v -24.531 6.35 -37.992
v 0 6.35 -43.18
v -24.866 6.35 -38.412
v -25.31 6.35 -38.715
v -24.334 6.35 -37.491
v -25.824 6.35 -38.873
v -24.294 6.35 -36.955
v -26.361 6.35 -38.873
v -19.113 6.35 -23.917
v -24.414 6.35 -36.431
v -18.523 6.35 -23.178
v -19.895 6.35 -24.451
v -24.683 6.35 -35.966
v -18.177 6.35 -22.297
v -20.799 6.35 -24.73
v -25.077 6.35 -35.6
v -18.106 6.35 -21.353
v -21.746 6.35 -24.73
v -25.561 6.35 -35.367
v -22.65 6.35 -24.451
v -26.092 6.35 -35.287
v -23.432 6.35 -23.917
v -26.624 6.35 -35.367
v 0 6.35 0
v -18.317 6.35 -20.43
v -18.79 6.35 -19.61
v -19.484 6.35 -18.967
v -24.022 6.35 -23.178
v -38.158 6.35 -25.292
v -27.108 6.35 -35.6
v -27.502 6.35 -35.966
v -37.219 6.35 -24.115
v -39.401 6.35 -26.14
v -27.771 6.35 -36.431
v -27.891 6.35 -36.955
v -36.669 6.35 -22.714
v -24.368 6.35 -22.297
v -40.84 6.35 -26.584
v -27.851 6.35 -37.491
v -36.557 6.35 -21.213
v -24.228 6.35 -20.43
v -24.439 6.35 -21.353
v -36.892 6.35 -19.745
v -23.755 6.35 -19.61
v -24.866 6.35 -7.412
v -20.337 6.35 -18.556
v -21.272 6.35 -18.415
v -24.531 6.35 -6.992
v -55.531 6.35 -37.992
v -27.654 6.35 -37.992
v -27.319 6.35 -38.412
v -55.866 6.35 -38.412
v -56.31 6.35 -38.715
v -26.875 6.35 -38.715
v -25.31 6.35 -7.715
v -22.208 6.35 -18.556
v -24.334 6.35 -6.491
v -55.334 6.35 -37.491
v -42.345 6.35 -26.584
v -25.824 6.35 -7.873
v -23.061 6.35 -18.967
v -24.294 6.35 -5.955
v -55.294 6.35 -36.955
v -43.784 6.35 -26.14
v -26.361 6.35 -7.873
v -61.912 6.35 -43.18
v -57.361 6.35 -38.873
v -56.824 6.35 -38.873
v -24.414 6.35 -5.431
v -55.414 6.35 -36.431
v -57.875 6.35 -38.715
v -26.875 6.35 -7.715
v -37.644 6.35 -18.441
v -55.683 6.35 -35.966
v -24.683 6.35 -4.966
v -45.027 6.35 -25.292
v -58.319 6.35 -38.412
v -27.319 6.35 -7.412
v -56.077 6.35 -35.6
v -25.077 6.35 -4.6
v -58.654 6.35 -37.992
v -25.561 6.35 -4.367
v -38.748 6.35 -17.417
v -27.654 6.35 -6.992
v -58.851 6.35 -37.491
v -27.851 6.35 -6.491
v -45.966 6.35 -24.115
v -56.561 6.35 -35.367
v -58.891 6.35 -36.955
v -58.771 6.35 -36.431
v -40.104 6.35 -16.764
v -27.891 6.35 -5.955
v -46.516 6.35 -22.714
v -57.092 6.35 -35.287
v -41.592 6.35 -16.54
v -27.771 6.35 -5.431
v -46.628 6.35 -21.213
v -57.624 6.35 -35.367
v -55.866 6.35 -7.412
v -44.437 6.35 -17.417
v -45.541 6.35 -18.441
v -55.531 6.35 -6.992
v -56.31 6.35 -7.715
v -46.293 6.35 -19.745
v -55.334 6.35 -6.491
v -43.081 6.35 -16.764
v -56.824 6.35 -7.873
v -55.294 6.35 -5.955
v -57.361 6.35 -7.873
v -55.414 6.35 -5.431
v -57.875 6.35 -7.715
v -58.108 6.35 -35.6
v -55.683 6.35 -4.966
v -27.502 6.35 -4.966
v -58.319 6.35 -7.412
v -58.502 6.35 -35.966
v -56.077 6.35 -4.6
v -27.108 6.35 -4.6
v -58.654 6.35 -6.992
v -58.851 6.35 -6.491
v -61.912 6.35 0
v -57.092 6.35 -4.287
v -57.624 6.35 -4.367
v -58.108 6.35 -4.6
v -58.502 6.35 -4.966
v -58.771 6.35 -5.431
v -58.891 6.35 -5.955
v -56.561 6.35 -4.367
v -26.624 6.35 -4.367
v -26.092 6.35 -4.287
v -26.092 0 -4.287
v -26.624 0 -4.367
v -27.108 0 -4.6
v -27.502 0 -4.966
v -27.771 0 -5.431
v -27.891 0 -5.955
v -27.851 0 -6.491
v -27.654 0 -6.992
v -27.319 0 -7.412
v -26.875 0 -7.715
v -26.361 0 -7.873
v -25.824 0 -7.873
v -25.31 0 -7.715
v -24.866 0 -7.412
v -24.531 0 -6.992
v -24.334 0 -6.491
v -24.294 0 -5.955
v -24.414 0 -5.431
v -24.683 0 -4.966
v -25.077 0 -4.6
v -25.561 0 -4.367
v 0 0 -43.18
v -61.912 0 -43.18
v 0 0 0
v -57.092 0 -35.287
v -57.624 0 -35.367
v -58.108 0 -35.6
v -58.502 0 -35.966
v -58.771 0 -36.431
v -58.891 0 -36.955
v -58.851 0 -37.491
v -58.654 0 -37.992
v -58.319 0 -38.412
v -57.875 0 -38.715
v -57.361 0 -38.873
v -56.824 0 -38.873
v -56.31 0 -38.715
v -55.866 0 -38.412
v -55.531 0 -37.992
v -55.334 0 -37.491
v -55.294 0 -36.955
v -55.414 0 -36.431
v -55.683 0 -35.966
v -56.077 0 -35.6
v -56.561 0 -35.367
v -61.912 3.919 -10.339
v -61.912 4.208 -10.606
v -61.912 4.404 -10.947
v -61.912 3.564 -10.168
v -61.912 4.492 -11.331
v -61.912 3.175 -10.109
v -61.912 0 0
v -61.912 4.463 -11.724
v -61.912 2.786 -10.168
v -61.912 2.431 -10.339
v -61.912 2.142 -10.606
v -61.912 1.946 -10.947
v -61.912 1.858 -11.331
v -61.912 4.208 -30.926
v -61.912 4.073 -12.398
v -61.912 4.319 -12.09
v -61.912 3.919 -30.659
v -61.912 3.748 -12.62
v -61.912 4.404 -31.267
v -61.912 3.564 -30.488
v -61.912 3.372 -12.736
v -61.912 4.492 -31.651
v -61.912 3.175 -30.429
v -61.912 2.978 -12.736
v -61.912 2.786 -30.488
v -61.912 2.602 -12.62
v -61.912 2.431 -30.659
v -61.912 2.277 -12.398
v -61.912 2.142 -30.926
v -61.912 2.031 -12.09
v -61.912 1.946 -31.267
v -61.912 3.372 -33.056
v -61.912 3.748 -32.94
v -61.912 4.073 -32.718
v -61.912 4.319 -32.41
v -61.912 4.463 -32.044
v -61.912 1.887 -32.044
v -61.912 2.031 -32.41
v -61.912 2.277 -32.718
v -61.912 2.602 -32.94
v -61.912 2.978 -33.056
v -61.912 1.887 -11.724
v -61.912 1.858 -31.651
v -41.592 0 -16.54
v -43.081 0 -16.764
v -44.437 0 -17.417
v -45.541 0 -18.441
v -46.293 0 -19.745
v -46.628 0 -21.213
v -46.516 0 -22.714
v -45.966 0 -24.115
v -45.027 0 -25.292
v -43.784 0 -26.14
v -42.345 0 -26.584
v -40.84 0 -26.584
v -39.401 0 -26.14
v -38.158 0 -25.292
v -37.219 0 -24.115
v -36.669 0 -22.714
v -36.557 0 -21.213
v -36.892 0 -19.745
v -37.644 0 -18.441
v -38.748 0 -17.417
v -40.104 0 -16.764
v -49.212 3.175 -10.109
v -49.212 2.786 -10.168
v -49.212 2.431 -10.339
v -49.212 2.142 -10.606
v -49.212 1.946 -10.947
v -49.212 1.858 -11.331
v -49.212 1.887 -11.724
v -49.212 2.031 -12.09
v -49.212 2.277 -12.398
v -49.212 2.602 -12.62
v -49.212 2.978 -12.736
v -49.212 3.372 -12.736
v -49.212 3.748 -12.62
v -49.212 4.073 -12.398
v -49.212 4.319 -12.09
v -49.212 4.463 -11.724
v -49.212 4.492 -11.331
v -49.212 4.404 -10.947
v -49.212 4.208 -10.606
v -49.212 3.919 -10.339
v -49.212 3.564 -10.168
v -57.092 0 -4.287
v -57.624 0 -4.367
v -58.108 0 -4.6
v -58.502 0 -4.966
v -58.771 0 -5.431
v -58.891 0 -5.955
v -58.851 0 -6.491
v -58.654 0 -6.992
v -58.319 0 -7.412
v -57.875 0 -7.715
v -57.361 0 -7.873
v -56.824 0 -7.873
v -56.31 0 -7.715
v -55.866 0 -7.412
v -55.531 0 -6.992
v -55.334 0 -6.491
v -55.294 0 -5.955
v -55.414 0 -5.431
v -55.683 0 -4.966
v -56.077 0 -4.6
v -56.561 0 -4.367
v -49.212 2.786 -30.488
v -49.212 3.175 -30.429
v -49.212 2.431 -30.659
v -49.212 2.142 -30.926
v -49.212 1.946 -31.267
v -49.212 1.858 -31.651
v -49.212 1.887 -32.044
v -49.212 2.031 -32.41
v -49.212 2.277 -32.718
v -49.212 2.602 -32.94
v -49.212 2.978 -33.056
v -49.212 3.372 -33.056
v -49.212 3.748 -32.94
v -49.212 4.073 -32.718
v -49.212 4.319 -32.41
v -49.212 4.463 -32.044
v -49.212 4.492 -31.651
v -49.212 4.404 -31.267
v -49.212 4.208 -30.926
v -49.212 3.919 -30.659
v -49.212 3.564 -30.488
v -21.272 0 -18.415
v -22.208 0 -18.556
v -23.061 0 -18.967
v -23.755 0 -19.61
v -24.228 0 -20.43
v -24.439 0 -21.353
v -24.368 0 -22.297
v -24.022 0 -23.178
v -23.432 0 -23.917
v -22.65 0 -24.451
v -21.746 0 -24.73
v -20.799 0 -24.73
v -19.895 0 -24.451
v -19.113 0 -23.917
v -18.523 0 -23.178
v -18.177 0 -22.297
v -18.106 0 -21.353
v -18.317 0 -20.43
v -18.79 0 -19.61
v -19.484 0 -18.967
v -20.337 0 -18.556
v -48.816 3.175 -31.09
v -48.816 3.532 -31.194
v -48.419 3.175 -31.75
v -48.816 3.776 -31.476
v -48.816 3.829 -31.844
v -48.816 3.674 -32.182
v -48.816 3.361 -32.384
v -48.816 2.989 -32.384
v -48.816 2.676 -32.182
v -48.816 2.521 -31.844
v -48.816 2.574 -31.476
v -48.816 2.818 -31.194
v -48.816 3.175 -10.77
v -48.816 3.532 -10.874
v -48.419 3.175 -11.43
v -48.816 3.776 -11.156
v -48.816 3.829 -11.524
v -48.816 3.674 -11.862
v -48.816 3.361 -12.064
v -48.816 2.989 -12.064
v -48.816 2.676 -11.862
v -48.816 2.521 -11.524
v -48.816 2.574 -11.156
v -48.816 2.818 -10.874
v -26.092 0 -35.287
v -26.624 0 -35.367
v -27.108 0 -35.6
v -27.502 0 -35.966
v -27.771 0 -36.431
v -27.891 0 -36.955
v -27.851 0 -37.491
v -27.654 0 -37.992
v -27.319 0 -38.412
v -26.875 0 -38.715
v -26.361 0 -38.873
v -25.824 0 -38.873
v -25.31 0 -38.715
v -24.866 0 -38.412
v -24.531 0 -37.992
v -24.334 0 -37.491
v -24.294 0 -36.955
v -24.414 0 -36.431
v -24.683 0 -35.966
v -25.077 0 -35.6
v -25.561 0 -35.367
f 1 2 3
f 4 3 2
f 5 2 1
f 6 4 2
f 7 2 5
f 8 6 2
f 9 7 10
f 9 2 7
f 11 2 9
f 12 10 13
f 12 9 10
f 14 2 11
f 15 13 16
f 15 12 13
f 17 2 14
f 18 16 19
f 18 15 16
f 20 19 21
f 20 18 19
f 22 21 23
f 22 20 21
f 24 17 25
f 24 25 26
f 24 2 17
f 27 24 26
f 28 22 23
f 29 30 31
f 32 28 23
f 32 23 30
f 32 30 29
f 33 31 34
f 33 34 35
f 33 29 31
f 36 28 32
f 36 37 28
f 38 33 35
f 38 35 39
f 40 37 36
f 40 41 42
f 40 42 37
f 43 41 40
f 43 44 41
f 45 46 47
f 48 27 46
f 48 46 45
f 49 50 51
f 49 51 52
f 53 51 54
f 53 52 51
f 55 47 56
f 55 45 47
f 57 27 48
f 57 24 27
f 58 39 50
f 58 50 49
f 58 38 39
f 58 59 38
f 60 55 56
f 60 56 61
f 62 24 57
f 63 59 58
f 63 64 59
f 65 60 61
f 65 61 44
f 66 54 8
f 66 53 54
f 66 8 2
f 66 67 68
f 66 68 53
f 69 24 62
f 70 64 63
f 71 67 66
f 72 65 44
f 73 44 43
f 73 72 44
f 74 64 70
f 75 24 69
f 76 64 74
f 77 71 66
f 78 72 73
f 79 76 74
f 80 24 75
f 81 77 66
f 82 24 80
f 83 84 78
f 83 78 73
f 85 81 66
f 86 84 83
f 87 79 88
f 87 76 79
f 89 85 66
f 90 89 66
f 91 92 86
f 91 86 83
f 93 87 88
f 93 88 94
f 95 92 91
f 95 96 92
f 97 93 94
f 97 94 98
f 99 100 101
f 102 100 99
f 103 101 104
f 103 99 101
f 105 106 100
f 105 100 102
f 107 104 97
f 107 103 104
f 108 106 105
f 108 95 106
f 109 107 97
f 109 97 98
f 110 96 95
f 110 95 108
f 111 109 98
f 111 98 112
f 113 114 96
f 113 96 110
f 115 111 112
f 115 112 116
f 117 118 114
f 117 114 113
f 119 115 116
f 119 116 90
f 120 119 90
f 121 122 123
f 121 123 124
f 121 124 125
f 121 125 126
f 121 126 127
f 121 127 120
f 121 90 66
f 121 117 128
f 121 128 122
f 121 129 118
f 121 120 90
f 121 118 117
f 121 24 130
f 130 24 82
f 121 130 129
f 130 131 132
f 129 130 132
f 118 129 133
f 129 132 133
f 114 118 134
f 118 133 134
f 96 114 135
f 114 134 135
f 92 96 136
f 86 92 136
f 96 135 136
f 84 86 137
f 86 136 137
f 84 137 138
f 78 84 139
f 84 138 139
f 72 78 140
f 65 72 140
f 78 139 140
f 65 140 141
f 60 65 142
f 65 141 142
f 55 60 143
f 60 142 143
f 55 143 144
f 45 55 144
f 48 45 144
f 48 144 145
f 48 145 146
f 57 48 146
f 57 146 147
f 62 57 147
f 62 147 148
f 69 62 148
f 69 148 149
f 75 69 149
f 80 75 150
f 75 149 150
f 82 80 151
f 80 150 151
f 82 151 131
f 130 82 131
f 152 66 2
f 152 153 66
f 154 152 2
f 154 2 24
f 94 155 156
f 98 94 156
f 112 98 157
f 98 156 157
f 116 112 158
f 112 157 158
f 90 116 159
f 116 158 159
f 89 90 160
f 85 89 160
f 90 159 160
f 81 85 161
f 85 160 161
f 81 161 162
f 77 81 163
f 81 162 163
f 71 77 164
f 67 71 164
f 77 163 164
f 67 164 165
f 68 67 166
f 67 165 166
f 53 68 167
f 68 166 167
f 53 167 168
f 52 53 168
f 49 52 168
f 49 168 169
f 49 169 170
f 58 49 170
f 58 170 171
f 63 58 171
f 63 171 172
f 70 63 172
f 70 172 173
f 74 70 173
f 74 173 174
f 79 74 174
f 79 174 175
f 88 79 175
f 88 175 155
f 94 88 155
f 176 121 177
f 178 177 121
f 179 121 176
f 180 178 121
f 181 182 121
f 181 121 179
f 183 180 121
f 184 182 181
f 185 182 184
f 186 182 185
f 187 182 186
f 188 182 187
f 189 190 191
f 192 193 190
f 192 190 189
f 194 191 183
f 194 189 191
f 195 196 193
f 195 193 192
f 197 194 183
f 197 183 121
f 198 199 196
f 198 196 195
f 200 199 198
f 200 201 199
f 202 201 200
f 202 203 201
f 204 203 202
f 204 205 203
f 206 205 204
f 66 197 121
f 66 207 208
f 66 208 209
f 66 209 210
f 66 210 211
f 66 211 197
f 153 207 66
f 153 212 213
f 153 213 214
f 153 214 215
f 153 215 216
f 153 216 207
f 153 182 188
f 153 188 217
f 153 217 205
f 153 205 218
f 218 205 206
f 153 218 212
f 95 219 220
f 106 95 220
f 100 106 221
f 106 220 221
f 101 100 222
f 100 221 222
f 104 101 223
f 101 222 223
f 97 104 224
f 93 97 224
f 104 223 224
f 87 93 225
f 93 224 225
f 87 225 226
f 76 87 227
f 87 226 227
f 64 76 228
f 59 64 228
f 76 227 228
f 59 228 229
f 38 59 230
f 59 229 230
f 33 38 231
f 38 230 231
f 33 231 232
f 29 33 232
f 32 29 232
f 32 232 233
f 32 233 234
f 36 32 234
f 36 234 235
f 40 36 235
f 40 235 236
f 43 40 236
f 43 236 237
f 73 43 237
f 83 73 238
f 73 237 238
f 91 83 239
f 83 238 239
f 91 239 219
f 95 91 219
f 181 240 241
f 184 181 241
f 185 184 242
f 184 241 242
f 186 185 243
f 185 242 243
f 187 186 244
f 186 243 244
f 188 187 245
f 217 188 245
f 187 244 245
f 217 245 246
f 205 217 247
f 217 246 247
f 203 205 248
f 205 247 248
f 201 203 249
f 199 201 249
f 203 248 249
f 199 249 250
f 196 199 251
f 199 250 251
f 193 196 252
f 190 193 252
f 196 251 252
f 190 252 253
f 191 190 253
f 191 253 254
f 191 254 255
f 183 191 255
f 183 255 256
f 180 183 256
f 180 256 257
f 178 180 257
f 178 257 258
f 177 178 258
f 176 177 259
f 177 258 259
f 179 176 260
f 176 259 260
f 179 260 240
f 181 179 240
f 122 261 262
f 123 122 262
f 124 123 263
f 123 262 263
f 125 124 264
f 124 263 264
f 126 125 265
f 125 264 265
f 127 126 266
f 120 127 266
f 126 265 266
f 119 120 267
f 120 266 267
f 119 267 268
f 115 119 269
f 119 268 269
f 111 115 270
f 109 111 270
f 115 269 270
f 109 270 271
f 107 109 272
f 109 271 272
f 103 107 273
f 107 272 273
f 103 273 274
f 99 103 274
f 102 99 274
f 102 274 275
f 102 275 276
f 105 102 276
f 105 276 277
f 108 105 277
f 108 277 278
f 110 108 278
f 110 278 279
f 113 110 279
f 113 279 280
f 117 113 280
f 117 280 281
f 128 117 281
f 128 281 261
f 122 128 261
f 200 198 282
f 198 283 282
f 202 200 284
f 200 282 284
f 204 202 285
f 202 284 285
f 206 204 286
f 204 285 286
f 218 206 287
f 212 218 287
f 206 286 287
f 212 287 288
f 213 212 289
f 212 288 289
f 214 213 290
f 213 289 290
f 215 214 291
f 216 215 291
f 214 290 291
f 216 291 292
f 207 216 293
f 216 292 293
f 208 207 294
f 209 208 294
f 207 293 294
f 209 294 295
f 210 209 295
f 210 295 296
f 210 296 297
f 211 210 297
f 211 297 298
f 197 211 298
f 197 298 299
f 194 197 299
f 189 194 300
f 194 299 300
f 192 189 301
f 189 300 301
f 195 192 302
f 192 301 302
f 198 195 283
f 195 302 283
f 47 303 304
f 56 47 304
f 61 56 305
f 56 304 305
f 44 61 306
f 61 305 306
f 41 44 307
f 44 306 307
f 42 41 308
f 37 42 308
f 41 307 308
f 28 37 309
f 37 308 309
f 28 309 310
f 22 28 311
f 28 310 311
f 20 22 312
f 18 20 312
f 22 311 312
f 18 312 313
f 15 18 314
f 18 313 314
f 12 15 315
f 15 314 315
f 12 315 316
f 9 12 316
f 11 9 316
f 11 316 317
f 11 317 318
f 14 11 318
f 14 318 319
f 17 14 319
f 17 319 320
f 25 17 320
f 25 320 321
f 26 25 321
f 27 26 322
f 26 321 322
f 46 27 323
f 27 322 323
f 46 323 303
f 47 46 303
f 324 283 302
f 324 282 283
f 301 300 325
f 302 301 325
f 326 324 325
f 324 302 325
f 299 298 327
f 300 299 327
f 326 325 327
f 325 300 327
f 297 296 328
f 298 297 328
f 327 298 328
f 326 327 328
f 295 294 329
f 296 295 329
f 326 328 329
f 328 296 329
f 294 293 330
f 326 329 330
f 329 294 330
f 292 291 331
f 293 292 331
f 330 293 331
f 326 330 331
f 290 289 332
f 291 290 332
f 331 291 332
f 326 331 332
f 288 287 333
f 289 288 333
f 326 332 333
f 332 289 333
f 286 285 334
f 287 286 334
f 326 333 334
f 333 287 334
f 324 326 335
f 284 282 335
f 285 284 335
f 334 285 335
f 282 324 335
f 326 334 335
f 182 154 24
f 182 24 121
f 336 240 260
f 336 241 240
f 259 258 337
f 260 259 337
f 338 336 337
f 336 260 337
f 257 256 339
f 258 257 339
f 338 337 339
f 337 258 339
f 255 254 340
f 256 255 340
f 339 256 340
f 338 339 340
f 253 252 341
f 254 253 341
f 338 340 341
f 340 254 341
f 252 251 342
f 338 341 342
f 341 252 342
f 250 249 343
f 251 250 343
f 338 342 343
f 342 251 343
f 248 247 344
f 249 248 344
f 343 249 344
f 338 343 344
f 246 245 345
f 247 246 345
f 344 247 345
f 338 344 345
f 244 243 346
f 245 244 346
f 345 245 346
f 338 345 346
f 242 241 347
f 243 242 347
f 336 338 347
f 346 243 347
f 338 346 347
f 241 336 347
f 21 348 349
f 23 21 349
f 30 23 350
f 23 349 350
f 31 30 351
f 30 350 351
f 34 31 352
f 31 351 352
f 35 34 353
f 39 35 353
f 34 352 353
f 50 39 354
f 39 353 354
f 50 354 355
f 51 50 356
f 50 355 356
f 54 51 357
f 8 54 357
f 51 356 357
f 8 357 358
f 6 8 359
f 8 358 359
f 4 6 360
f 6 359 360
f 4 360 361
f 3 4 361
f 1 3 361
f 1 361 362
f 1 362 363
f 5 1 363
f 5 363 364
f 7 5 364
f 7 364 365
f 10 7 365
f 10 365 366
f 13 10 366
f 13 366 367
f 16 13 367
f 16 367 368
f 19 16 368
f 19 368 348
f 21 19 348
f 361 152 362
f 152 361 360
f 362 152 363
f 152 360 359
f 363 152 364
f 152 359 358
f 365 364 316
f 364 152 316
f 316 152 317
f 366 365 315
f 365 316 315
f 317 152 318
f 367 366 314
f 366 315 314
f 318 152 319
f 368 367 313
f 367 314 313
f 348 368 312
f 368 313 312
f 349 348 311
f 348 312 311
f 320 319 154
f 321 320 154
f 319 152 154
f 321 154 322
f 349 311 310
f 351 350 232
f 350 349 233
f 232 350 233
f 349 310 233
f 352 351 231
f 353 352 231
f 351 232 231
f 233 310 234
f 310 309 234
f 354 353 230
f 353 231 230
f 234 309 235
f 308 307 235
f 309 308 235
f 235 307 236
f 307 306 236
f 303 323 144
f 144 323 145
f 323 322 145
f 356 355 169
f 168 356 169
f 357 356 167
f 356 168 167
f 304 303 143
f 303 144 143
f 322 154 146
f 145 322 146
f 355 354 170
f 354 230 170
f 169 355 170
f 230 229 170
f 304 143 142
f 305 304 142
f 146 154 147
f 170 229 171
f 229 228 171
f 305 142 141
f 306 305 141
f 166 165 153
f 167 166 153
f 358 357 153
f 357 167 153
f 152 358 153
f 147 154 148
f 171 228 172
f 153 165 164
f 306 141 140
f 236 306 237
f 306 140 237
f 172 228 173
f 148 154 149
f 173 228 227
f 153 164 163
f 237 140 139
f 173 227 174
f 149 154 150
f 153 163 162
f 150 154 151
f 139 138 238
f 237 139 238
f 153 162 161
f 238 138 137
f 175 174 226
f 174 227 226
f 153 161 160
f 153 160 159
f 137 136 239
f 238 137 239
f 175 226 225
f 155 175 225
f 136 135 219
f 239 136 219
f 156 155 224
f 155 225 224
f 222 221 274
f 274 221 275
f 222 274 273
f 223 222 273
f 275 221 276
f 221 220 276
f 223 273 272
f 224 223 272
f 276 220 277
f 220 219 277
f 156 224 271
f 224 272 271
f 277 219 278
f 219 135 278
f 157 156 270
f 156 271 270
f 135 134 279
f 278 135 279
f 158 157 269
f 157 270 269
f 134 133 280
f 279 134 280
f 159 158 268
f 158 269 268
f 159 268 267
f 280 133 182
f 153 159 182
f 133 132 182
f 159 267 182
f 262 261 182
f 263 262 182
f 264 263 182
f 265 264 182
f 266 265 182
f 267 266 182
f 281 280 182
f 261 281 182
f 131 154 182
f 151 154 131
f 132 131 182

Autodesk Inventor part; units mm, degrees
ref_plane "YZ Plane" through (0, 0, 0) normal (1, 0, 0) x (0, 1, 0)
ref_plane "XZ Plane" through (0, 0, 0) normal (0, 1, 0) x (-1, 0, 0)
ref_plane "XY Plane" through (0, 0, 0) normal (0, 0, 1) x (1, 0, 0)
sketch "Sketch1" plane through (0, 0, 0) normal (0, 1, 0) x (-1, 0, 0)
  line L0 (0, 0) -> (61.9125, 0)
  line L1 (61.9125, 0) -> (61.9125, -43.18)
  line L2 (61.9125, -43.18) -> (0, -43.18)
  line L3 (0, -43.18) -> (0, 0)
  dimension "d0" = 61.9125
  dimension "d1" = 43.18
extrude "Extrusion1" add sketch "Sketch1" along normal blind 6.35
sketch "Sketch2" plane through (0, 6.35, 0) normal (0, 1, 0) x (1, 0, 0)
  line L0 (-61.9125, 43.18) -> (-61.9125, 0)
  line L1 (-61.9125, 0) -> (0, 0)
  line L2 (0, 0) -> (0, 43.18)
  line L3 (-61.9125, 43.18) -> (0, 43.18)
  line L4 (-61.9125, 43.18) -> (-61.9125, 0) projected
  line L5 (0, 43.18) -> (-61.9125, 43.18) projected
  line L6 (-61.9125, 0) -> (0, 0) projected
  line L7 (0, 0) -> (0, 43.18) projected
  point P0 (-41.5925, 21.59)
  point P1 (-57.0925, 37.09)
  point P2 (-57.0925, 6.09)
  point P3 (-26.0925, 6.09)
  point P4 (-21.2725, 21.59)
  point P5 (-26.0925, 37.09)
  dimension "d4" = 6.09
  dimension "d5" = 4.82
  dimension "d6" = 6.09
  dimension "d7" = 4.82
  dimension "d8" = 6.09
  dimension "d9" = 26.0925
  dimension "d10" = 21.2725
  dimension "d11" = 21.59
  dimension "d12" = 6.09
  dimension "d13" = 26.0925
  dimension "d14" = 21.59
  dimension "d15" = 20.32
hole "Hole1" at (-57.0925, 6.35, -37.09) at (-57.0925, 6.35, -6.09) at (-26.0925, 6.35, -6.09) at (-26.0925, 6.35, -37.09) direction (0, -1, 0) diameter 3.6068 depth 10.9728 tip angle 118 clearance for "Hex Head Cap Screw ISO 24017" size "M3" standard "ISO"
hole "Hole2" at (-41.5925, 6.35, -21.59) direction (0, -1, 0) diameter 10.1001 depth 10.9728 tip angle 118
sketch "Sketch3" plane through (-61.9125, 0, -43.18) normal (-1, 0, 0) x (0, 0, 1)
  line L0 (0, 0) -> (0, 6.35) projected
  line L1 (43.18, 0) -> (43.18, 6.35) projected
  line L2 (0, 6.35) -> (43.18, 6.35) projected
  point P0 (11.43, 3.175)
  point P1 (31.75, 3.175)
  dimension "d37" = 11.43
  dimension "d38" = 11.43
  dimension "d39" = 3.175
hole "Hole3" at (-61.9125, 3.175, -31.75) at (-61.9125, 3.175, -11.43) direction (1, 0, 0) diameter 2.6416 depth 12.7 tip angle 118 thread size "6-32 UNC" class "3B" standard "ANSI Unified Screw Threads"
hole "Hole4" at (-21.2725, 6.35, -21.59) direction (0, -1, 0) diameter 6.35 depth 10.9728 tip angle 118
properties part number "AR-BracketLeft2"
